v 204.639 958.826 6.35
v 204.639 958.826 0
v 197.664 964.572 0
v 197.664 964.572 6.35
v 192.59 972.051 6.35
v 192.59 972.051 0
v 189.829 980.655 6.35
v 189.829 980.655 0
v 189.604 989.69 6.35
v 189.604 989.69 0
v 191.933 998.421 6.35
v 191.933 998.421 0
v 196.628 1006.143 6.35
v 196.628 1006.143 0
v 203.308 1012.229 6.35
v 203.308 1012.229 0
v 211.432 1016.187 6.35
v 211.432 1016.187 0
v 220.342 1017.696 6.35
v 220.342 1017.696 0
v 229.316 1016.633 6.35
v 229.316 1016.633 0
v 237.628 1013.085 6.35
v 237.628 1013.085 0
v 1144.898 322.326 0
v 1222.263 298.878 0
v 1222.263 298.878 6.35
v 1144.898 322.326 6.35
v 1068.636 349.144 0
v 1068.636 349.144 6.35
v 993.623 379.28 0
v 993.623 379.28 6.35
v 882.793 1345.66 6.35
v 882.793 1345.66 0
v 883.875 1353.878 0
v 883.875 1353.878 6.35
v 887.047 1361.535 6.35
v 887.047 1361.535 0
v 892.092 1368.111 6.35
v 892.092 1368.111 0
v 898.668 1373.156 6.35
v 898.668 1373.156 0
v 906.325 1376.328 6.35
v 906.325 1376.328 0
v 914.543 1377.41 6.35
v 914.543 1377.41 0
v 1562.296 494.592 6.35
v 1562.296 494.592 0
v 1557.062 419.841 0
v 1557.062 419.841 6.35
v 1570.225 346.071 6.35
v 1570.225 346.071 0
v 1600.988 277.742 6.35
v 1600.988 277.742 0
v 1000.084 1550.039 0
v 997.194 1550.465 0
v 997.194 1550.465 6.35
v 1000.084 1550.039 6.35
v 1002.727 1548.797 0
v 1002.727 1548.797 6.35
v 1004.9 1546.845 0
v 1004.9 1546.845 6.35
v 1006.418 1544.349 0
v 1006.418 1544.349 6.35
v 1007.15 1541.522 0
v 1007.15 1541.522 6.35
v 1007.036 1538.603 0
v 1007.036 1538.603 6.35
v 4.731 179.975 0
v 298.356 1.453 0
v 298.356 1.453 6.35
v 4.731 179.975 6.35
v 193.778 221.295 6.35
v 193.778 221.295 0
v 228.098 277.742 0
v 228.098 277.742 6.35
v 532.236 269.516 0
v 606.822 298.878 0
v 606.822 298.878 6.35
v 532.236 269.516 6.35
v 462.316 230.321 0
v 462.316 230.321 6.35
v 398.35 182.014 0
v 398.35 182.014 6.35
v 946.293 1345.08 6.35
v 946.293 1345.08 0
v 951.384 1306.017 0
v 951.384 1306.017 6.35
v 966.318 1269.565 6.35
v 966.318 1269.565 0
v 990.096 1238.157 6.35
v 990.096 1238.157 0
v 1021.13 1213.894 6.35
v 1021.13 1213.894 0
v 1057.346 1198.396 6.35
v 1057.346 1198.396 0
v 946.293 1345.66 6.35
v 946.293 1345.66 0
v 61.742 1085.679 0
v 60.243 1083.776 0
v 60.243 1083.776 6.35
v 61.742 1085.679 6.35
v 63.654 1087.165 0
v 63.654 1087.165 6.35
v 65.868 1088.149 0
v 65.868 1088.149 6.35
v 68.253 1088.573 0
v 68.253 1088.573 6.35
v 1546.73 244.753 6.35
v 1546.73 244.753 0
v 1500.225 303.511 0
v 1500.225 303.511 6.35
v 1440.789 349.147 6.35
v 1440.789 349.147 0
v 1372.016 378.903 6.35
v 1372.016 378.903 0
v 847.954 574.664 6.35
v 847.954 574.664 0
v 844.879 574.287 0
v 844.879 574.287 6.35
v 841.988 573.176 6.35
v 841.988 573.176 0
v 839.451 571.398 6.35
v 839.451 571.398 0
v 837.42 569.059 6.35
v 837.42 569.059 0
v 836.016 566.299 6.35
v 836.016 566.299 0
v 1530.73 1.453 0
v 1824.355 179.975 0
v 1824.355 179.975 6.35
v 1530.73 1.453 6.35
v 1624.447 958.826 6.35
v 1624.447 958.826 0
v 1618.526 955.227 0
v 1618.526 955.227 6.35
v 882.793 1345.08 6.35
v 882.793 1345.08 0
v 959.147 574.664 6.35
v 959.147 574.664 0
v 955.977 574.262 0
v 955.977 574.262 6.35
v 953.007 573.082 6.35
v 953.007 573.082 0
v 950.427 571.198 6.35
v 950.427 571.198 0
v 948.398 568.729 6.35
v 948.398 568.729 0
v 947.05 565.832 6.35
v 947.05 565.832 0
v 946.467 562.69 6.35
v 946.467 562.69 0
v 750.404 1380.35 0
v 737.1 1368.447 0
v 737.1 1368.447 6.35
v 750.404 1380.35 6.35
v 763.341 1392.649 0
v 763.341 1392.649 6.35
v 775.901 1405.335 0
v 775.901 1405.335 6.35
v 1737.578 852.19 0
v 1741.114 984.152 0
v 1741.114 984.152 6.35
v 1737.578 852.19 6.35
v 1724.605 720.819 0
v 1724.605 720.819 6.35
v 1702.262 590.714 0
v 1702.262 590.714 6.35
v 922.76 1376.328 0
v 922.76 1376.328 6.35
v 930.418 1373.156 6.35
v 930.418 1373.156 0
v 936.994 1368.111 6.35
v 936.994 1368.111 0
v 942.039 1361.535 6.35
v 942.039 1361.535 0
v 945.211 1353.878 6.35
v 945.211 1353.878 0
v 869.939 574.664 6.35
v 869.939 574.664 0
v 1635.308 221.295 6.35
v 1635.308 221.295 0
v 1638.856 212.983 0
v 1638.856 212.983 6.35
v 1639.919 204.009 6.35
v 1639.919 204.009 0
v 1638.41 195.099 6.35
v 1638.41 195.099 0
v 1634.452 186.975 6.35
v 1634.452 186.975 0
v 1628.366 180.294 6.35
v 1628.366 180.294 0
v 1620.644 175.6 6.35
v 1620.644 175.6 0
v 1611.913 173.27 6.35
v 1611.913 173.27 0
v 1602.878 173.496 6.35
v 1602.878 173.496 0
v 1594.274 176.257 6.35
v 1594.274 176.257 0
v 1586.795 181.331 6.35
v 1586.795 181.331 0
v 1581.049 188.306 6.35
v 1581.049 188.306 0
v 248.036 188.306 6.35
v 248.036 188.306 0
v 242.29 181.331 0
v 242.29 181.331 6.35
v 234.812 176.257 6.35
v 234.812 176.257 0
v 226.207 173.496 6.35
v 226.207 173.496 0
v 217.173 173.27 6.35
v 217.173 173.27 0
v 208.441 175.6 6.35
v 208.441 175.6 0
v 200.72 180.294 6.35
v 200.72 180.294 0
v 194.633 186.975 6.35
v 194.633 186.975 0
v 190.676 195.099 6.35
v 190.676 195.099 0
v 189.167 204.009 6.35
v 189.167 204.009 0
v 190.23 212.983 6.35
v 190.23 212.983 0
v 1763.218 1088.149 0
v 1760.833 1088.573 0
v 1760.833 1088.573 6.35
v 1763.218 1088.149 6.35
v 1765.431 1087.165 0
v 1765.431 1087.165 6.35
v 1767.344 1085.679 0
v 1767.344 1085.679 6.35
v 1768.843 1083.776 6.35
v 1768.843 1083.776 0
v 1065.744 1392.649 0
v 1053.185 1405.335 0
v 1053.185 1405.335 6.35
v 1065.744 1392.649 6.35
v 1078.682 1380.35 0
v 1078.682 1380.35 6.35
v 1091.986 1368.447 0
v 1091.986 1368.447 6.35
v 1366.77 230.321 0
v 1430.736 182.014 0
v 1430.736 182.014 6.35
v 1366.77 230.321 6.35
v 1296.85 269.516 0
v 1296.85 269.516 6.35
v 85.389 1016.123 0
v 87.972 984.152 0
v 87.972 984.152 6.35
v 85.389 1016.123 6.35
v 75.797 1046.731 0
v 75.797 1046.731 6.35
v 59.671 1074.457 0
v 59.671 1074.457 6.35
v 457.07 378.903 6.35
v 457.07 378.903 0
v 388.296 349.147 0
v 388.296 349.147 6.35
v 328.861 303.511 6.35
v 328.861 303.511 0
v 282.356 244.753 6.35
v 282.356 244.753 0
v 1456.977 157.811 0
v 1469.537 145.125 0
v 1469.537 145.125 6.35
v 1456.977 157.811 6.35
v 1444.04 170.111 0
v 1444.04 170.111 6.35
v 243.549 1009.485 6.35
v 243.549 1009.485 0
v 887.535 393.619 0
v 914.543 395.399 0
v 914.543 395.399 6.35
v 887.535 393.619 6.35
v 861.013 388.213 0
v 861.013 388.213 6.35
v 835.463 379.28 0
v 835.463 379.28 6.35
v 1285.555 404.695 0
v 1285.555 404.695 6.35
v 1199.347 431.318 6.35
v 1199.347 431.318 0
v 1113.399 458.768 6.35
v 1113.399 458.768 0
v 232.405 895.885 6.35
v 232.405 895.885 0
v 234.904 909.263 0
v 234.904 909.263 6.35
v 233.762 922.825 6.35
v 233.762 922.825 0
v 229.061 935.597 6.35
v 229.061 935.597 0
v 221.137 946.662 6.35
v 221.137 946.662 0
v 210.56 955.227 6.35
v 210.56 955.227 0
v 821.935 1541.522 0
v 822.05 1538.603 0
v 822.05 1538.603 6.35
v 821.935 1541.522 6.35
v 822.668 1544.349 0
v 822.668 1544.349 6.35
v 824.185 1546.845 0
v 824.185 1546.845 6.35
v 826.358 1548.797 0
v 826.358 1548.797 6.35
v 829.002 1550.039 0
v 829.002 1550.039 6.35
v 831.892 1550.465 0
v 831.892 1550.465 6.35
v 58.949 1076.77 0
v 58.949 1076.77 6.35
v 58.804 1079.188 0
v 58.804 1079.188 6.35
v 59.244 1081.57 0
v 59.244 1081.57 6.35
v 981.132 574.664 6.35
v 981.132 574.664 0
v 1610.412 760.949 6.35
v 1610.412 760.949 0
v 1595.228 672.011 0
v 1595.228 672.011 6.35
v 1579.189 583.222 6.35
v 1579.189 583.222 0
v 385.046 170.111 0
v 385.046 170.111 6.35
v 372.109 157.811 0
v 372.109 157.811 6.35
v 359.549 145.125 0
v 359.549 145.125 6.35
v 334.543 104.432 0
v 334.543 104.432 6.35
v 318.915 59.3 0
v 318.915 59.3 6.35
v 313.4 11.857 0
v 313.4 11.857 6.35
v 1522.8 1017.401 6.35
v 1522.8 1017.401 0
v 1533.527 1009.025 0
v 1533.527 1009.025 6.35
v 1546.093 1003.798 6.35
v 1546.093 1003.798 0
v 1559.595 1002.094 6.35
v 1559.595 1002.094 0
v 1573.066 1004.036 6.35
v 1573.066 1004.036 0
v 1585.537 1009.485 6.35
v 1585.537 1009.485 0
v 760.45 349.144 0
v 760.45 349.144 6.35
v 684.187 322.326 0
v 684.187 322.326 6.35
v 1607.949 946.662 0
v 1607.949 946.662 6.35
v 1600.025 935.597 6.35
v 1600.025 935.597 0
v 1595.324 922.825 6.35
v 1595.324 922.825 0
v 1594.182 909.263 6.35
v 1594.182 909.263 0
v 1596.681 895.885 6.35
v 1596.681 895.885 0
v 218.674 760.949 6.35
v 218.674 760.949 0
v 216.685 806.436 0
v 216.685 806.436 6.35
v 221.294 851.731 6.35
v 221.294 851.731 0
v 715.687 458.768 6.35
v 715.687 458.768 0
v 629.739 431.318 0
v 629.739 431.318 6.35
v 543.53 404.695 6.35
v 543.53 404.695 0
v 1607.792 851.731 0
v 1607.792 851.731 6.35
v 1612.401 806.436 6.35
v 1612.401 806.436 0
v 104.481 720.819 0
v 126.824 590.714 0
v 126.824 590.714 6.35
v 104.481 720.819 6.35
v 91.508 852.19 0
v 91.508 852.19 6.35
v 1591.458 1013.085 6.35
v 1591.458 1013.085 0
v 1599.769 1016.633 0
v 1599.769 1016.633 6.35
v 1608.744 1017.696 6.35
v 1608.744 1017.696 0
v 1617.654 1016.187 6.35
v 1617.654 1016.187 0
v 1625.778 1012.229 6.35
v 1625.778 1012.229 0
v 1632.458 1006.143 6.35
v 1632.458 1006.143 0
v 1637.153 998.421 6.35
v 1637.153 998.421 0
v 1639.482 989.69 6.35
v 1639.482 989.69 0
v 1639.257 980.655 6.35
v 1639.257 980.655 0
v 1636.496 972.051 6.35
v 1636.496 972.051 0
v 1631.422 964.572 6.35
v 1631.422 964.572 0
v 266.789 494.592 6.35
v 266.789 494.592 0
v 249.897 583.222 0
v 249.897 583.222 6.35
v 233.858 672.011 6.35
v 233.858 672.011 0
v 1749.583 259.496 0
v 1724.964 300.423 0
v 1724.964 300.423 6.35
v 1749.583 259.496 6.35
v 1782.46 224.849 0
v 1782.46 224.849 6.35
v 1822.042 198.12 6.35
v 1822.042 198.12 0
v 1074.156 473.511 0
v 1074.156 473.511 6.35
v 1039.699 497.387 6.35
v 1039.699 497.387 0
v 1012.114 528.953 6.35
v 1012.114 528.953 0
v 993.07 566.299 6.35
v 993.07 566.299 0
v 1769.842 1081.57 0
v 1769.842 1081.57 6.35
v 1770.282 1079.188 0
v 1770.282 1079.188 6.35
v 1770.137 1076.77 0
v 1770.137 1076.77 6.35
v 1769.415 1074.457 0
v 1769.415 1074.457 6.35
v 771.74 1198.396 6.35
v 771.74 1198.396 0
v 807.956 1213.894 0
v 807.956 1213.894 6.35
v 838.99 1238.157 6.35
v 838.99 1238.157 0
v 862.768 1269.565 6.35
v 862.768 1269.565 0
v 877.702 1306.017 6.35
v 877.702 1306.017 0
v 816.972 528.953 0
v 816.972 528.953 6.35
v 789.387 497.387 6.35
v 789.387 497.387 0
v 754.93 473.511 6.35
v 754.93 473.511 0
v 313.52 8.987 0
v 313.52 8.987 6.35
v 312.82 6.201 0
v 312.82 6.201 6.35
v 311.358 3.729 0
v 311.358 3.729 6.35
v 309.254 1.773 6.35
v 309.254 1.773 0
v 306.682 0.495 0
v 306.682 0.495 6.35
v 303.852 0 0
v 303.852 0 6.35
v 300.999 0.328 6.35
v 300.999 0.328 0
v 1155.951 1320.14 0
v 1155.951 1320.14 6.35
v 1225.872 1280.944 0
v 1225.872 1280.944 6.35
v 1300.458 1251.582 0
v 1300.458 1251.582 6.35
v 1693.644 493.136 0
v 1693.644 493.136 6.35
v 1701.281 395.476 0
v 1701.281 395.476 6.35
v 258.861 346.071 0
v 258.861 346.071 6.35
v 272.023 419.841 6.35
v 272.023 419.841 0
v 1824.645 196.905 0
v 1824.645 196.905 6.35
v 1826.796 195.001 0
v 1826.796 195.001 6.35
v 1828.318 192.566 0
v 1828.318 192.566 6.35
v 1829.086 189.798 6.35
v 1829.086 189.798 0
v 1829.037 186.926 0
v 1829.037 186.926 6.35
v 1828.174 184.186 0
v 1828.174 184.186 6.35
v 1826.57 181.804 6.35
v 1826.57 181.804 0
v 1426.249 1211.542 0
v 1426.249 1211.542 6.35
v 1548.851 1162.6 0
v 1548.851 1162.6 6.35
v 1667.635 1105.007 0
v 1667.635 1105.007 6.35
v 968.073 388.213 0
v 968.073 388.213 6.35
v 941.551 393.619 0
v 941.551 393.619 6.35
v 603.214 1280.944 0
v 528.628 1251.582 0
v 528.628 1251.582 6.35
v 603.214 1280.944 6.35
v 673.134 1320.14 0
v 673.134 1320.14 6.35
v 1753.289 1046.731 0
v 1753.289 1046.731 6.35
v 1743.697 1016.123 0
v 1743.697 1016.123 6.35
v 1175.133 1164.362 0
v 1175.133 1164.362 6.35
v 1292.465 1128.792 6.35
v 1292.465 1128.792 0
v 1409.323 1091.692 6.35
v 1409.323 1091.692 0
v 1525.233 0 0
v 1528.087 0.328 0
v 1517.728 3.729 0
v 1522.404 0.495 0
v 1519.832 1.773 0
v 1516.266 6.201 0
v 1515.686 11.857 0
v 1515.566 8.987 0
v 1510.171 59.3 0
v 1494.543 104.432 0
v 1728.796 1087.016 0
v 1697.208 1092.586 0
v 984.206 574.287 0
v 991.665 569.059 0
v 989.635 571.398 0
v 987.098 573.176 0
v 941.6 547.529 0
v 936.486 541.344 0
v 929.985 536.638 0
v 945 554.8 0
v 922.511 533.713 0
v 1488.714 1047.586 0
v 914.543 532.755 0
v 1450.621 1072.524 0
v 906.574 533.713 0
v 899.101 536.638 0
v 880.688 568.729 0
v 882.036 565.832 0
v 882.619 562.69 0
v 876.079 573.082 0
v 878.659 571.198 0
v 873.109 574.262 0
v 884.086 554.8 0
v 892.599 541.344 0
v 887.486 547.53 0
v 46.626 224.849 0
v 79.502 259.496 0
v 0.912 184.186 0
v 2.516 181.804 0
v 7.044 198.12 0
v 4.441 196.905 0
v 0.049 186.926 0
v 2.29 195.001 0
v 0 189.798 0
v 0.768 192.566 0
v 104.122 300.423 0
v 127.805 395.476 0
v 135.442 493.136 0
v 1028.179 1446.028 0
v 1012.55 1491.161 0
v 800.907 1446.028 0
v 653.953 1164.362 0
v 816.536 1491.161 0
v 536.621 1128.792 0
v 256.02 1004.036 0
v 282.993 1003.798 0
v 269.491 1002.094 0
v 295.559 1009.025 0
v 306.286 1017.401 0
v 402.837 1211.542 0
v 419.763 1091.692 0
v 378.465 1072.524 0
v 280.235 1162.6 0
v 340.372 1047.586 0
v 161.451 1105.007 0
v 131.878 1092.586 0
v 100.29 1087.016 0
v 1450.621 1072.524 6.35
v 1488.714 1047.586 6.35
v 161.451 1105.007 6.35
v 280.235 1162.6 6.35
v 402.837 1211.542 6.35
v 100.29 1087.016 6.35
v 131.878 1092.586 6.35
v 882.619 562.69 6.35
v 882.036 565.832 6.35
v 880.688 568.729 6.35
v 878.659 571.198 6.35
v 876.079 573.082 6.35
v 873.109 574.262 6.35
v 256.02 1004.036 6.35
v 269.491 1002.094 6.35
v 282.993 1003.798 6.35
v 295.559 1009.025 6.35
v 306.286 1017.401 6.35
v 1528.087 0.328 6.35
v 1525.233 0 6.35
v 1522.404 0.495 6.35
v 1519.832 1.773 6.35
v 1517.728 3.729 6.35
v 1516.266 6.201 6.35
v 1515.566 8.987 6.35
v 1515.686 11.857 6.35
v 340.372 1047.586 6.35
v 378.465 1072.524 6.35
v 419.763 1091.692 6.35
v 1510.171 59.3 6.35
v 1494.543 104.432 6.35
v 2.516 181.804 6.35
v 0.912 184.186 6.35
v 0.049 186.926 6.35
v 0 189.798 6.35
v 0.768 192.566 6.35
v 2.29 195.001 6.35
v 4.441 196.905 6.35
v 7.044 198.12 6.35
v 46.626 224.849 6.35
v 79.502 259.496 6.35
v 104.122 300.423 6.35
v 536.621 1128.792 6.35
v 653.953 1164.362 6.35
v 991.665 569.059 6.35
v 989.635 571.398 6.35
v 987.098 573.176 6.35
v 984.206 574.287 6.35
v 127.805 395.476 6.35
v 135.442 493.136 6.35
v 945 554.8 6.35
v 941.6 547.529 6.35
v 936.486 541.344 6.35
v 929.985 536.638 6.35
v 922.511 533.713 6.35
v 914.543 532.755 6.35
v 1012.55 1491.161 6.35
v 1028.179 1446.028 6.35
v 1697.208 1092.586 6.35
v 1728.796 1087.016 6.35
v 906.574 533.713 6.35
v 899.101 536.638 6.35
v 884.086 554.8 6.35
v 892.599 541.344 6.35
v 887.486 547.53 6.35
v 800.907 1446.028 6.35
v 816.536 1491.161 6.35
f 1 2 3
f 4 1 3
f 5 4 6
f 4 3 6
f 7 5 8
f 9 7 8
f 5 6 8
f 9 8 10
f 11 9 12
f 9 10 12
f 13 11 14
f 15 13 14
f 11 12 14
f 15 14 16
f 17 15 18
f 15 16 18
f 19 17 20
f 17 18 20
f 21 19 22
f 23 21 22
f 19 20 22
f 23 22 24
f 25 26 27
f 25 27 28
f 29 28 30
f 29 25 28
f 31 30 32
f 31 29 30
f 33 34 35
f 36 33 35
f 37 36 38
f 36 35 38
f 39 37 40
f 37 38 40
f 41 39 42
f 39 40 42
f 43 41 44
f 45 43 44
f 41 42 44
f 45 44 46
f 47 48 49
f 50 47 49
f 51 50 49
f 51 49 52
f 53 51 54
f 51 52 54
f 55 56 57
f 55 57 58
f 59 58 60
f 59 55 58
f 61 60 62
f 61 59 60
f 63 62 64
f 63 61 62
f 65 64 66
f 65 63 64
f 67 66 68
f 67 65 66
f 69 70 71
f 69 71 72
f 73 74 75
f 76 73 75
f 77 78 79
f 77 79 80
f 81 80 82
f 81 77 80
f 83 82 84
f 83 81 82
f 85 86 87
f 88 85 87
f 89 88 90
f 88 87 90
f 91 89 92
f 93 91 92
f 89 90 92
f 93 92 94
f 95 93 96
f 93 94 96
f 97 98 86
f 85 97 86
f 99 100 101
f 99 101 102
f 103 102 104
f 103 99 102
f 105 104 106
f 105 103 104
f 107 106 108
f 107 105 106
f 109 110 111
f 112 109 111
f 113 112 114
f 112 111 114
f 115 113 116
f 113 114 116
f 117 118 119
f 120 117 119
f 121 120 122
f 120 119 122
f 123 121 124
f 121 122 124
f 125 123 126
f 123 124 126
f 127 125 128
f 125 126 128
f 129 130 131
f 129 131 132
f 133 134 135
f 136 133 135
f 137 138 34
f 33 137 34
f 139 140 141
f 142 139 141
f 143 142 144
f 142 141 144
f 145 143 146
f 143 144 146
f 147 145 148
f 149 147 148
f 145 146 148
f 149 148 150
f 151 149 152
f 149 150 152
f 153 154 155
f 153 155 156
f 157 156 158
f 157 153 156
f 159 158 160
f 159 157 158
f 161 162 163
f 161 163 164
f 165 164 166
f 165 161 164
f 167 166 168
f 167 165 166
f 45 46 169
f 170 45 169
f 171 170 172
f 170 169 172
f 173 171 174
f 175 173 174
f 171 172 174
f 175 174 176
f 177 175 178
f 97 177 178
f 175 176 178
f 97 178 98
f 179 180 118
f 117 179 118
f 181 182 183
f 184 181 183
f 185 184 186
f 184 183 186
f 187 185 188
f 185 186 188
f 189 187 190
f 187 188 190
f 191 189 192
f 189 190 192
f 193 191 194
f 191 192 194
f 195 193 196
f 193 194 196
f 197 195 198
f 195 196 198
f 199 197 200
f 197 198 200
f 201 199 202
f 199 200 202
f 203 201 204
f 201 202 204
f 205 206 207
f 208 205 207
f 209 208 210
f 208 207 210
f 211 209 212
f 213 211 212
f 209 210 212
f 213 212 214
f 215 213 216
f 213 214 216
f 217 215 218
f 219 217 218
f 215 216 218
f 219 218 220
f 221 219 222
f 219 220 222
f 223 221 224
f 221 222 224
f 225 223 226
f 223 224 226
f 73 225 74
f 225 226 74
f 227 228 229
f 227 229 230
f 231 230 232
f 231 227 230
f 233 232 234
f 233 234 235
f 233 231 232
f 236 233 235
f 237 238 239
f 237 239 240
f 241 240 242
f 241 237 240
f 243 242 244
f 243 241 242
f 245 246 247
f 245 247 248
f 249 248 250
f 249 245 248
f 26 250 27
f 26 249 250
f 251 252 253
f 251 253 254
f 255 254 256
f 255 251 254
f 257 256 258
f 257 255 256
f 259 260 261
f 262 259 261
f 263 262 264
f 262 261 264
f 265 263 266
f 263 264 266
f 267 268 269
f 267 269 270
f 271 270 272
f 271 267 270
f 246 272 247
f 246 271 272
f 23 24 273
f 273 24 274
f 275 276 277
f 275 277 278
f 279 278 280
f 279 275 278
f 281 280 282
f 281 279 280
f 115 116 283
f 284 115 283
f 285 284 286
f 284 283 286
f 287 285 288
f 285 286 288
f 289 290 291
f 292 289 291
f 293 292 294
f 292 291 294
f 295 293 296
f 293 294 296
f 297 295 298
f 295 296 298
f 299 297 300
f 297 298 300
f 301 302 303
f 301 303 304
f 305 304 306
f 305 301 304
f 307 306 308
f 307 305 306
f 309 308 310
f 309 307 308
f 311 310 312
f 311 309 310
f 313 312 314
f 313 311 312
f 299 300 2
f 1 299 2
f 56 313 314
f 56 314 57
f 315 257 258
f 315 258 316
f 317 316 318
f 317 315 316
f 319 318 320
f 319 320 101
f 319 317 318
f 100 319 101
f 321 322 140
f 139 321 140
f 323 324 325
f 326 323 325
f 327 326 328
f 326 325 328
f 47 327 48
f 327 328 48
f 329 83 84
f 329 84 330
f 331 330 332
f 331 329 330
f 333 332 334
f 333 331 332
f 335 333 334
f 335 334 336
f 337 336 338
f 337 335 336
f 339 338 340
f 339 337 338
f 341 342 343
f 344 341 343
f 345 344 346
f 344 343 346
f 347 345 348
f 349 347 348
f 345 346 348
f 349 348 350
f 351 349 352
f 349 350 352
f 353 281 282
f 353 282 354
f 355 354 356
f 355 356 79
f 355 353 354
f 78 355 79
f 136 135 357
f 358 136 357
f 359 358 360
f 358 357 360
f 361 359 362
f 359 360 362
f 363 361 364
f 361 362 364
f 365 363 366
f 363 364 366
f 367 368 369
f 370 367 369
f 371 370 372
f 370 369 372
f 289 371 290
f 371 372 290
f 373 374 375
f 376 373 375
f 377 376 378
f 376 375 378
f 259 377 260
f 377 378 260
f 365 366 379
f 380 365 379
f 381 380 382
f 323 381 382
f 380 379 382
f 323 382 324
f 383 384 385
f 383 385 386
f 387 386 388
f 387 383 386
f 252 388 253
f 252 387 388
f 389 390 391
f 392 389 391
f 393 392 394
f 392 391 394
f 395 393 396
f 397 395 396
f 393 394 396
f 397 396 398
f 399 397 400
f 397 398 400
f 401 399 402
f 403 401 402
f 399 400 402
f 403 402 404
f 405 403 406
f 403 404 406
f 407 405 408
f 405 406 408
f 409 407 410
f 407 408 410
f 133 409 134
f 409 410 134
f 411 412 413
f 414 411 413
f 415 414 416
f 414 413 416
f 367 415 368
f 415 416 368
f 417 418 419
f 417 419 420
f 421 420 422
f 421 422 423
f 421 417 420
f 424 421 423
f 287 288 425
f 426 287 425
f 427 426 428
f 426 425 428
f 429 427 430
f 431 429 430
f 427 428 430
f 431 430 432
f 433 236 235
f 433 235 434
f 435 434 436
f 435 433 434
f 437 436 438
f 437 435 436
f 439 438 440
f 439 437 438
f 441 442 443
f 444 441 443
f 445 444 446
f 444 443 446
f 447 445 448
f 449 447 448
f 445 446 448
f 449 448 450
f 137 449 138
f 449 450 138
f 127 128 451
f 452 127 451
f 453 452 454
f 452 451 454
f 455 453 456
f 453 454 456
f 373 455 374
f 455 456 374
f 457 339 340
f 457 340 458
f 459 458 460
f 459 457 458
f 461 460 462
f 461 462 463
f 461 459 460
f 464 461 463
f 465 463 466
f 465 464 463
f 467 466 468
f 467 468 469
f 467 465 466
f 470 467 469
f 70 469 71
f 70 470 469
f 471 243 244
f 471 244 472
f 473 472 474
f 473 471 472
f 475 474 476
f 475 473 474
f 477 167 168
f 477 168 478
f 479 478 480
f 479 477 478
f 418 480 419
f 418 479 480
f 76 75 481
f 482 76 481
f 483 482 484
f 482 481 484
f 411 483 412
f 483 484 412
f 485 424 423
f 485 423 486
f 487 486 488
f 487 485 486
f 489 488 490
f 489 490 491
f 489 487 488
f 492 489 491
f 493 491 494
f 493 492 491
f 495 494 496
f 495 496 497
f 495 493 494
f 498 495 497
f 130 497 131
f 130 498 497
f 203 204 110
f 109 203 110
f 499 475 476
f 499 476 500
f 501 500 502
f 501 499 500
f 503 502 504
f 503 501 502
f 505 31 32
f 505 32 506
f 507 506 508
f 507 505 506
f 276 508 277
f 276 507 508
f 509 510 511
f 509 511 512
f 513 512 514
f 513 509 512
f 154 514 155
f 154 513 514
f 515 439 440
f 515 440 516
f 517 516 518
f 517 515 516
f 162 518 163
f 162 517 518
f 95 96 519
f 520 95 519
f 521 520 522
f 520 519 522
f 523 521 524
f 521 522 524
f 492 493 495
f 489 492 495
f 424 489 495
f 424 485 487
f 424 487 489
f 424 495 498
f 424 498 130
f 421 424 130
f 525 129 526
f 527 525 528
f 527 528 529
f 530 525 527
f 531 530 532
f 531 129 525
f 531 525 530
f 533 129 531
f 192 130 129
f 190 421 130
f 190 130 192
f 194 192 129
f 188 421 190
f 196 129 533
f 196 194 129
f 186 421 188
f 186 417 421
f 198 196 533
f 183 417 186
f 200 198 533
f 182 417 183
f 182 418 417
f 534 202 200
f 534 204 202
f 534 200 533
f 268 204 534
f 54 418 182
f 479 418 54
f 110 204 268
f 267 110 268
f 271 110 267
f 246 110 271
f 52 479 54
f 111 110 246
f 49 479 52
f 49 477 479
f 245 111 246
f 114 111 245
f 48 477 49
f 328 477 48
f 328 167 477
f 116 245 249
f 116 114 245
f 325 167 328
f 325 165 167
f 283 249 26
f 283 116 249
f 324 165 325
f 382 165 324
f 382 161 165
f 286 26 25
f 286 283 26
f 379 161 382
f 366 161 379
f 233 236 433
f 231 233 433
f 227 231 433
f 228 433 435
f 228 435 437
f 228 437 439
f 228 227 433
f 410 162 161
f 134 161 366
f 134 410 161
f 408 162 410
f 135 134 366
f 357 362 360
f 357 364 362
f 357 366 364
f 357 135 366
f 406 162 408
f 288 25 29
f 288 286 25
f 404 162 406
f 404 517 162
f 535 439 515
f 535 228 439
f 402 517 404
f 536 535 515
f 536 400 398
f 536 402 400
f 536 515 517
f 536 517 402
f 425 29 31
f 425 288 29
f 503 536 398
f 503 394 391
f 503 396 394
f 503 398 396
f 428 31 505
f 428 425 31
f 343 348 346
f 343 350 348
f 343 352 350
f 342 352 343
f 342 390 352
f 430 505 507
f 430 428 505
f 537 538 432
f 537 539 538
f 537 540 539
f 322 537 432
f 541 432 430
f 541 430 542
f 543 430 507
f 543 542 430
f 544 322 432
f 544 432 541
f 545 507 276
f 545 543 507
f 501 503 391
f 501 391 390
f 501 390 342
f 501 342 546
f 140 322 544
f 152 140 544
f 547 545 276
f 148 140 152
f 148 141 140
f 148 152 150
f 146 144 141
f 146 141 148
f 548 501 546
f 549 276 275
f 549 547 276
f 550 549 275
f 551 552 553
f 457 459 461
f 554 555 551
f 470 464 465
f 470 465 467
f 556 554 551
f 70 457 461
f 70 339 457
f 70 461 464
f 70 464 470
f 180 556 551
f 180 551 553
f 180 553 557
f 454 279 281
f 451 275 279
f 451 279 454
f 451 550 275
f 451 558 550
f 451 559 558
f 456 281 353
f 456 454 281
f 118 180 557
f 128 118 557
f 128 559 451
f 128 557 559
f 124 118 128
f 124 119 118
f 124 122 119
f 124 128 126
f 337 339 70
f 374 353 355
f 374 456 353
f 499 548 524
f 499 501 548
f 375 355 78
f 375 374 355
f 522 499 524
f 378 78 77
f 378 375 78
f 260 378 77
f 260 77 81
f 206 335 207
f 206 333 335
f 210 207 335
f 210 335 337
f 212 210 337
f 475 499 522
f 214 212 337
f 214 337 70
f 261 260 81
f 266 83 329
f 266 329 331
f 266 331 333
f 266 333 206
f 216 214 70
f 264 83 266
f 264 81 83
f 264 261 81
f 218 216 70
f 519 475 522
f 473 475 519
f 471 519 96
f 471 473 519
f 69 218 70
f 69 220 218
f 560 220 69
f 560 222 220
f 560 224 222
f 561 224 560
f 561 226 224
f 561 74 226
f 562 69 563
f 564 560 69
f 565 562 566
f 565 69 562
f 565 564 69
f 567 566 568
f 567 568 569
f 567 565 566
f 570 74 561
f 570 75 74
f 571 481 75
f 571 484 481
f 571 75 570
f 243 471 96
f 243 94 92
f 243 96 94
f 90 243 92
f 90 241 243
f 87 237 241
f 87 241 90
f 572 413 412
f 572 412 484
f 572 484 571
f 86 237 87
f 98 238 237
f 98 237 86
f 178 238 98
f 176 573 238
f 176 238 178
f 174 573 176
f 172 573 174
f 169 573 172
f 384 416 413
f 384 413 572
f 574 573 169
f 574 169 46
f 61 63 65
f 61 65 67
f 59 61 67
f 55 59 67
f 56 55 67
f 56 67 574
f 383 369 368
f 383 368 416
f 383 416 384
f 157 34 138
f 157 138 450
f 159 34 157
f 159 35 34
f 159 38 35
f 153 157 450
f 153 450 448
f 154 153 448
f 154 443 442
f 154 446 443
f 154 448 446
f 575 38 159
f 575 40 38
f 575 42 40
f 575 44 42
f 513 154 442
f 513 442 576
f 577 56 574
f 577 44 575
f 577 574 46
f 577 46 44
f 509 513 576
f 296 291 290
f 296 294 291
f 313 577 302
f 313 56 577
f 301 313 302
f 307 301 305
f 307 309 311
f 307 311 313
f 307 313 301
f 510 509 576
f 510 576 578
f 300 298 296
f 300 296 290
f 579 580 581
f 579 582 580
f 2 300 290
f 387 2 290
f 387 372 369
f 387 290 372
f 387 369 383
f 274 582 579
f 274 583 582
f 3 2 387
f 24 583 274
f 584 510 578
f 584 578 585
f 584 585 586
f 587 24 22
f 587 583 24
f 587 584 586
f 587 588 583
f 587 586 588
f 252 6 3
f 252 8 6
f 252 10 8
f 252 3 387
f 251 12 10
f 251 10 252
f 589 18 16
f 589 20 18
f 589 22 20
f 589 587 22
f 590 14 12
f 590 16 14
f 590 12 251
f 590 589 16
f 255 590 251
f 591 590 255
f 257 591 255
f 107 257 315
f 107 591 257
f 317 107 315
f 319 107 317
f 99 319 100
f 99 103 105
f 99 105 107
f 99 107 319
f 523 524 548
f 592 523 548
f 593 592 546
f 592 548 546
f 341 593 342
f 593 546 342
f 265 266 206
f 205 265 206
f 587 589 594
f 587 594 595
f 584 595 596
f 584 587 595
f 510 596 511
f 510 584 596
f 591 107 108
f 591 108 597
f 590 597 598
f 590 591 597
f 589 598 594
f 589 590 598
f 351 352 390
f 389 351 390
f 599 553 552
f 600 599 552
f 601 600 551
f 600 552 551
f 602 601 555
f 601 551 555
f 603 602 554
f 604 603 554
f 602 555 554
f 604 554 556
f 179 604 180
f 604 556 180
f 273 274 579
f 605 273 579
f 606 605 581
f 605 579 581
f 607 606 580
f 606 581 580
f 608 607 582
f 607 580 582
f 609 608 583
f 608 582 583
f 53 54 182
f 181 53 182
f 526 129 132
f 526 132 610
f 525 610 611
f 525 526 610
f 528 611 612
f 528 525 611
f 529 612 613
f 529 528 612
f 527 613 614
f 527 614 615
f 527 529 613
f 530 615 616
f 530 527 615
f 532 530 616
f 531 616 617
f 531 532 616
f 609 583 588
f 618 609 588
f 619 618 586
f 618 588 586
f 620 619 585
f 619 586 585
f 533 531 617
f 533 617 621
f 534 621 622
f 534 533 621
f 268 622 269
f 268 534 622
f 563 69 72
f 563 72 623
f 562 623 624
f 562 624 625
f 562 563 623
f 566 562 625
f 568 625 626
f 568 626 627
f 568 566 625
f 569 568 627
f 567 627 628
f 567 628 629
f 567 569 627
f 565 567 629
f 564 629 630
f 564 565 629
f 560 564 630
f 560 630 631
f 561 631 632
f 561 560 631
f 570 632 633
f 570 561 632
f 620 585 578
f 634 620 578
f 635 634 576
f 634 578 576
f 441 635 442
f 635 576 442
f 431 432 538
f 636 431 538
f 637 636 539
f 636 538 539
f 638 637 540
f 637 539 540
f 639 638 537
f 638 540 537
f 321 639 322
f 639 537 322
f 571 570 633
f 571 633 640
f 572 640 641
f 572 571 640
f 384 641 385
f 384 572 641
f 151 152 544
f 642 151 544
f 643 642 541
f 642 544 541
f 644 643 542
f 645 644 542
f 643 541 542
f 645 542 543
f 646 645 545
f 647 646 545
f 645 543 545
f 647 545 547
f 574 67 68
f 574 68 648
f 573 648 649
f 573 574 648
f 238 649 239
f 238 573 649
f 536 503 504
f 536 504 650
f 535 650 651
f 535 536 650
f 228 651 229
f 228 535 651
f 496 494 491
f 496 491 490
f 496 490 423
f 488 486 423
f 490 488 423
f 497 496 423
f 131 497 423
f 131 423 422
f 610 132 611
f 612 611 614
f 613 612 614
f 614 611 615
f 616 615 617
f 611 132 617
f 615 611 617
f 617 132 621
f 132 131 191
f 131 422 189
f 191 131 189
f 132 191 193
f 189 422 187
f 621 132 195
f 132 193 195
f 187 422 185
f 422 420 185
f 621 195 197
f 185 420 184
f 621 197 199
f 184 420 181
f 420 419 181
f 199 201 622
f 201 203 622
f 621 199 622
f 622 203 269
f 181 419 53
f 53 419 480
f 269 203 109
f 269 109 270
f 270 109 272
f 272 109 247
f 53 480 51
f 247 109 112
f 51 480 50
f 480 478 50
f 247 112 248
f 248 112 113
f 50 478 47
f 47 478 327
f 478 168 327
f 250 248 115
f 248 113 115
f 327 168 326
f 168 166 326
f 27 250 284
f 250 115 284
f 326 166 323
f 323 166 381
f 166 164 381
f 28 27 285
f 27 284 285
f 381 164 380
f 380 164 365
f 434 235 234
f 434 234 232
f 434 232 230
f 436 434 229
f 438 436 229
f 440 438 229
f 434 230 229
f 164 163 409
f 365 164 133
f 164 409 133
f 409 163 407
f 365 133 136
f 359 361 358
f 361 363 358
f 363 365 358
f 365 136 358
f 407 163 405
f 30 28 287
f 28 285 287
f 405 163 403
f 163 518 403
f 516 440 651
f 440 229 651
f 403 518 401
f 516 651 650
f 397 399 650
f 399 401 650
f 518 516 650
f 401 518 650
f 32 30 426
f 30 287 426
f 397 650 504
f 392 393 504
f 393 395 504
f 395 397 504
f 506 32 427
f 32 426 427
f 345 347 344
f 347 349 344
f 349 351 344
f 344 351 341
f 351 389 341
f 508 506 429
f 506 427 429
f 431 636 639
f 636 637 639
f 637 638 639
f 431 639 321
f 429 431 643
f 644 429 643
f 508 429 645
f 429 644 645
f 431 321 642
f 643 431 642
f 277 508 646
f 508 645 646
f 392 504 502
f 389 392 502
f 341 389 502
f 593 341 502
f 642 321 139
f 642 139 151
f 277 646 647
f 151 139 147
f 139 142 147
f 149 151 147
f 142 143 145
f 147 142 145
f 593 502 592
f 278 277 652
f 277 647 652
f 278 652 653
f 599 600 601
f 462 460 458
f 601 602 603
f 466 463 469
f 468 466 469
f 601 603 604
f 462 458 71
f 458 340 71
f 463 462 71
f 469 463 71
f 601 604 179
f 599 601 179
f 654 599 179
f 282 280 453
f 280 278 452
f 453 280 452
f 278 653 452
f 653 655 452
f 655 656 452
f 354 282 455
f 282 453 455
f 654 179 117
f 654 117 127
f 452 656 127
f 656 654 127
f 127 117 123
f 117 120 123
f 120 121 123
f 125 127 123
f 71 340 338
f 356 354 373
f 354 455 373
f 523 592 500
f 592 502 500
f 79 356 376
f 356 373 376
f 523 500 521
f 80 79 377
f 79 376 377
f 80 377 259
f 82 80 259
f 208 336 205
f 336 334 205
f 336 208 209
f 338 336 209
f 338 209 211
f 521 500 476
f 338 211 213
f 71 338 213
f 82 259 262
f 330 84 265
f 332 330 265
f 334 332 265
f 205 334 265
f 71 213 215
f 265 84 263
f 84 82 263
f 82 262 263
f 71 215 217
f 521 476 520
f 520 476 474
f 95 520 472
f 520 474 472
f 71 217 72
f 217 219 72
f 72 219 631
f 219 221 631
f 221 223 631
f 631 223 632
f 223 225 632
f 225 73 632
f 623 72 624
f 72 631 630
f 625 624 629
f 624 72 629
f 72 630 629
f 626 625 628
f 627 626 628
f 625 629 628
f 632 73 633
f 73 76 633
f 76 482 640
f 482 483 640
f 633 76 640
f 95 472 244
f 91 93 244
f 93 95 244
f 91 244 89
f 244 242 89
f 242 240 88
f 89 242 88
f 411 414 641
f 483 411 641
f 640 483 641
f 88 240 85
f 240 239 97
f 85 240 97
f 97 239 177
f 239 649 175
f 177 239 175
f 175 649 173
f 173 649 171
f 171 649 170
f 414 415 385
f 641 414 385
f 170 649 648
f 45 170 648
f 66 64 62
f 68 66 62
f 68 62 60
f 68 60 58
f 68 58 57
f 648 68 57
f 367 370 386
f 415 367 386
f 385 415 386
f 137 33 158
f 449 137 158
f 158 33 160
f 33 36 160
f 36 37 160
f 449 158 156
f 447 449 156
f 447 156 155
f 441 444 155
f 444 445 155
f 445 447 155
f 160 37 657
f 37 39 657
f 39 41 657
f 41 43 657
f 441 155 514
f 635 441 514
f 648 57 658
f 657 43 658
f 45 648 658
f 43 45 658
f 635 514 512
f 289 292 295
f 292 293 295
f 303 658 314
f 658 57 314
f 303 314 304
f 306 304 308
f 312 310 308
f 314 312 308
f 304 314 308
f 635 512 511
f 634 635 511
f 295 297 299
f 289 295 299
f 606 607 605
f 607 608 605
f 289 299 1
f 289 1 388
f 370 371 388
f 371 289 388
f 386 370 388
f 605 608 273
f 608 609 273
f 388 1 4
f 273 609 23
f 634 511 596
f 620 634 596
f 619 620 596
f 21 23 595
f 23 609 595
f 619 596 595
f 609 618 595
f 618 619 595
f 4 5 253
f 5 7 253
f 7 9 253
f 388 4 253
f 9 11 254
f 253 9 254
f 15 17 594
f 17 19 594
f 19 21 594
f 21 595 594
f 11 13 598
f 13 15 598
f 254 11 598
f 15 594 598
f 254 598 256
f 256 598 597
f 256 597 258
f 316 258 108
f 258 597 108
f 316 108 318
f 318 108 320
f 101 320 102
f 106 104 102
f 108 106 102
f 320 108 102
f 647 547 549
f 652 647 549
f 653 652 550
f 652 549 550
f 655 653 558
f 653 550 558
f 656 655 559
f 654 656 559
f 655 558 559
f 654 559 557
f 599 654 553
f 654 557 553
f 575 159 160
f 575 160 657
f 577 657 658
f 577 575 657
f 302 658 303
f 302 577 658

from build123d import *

# Parameters (mm, degrees)
BOSS_EXTRUDE1_DEPTH = 6.35


with BuildPart() as part:
    # Model → Boss-Extrude1 (new body)
    with BuildSketch(Plane.XY):
        with BuildLine():
            Line((4.731109074, 179.975171138), (151.543552764, 90.714118443))
            Line((151.543552764, 90.714118443), (298.355996454, 1.453065748))
            ThreePointArc((298.355996454, 1.453065748), (309.25405907, 1.773353837), (313.400175898, 11.857007366))
            ThreePointArc((313.400175898, 11.857007366), (325.499817287, 82.291618906), (359.548910429, 145.125487805))
            ThreePointArc((359.548910429, 145.125487805), (378.530992835, 164.009725995), (398.349908157, 182.013739434))
            ThreePointArc((398.349908157, 182.013739434), (496.609924919, 251.106758089), (606.822390935, 298.877967575))
            ThreePointArc((606.822390935, 298.877967575), (722.465722657, 335.316646957), (835.462841761, 379.280366099))
            ThreePointArc((835.462841761, 379.280366099), (874.182548891, 391.364362796), (914.542928671, 395.39901772))
            ThreePointArc((914.542928671, 395.39901772), (954.903308451, 391.364362796), (993.62301558, 379.280366099))
            ThreePointArc((993.62301558, 379.280366099), (1106.620134686, 335.316646956), (1222.26346641, 298.877967574))
            ThreePointArc((1222.26346641, 298.877967574), (1332.475932423, 251.106758088), (1430.735949184, 182.013739434))
            ThreePointArc((1430.735949184, 182.013739434), (1450.554864506, 164.009725995), (1469.536946912, 145.125487805))
            ThreePointArc((1469.536946912, 145.125487805), (1503.586040054, 82.291618906), (1515.685681443, 11.857007366))
            ThreePointArc((1515.685681443, 11.857007366), (1519.831798271, 1.773353837), (1530.729860887, 1.453065748))
            Line((1530.729860887, 1.453065748), (1677.542304577, 90.714118443))
            Line((1677.542304577, 90.714118443), (1824.354748267, 179.975171138))
            ThreePointArc((1824.354748267, 179.975171138), (1829.085903545, 189.797926504), (1822.041714251, 198.119569997))
            ThreePointArc((1822.041714251, 198.119569997), (1765.078027346, 241.277120886), (1724.963897376, 300.423485114))
            ThreePointArc((1724.963897376, 300.423485114), (1695.433102398, 444.147036942), (1702.261958811, 590.714065711))
            ThreePointArc((1702.261958811, 590.714065711), (1732.268416352, 786.388398141), (1741.114180038, 984.152359294))
            ThreePointArc((1741.114180038, 984.152359294), (1747.638220475, 1031.694941858), (1769.415270954, 1074.457312383))
            ThreePointArc((1769.415270954, 1074.457312383), (1770.281785592, 1079.18754246), (1768.843236262, 1083.776278673))
            ThreePointArc((1768.843236262, 1083.776278673), (1765.431383684, 1087.165258783), (1760.833075168, 1088.572910369))
            ThreePointArc((1760.833075168, 1088.572910369), (1712.84619872, 1088.919247204), (1667.635170438, 1105.00722974))
            ThreePointArc((1667.635170438, 1105.00722974), (1487.988377024, 1188.168888466), (1300.458187217, 1251.582292231))
            ThreePointArc((1300.458187217, 1251.582292231), (1190.245721199, 1299.353501718), (1091.985704435, 1368.446520373))
            ThreePointArc((1091.985704435, 1368.446520373), (1072.166789113, 1386.450533813), (1053.184706708, 1405.334772002))
            ThreePointArc((1053.184706708, 1405.334772002), (1019.135613566, 1468.168640901), (1007.035972176, 1538.603252442))
            ThreePointArc((1007.035972176, 1538.603252442), (1004.900450409, 1546.845116579), (997.194061205, 1550.464556193))
            Line((997.194061205, 1550.464556193), (914.542928671, 1550.464556193))
            Line((914.542928671, 1550.464556193), (831.891796136, 1550.464556193))
            ThreePointArc((831.891796136, 1550.464556193), (824.185406932, 1546.845116579), (822.049885165, 1538.603252442))
            ThreePointArc((822.049885165, 1538.603252442), (809.950243775, 1468.168640901), (775.901150633, 1405.334772002))
            ThreePointArc((775.901150633, 1405.334772002), (756.919068228, 1386.450533813), (737.100152906, 1368.446520373))
            ThreePointArc((737.100152906, 1368.446520373), (638.840136142, 1299.353501718), (528.627670124, 1251.582292231))
            ThreePointArc((528.627670124, 1251.582292231), (341.097480319, 1188.168888466), (161.450686905, 1105.007229742))
            ThreePointArc((161.450686905, 1105.007229742), (116.239658622, 1088.919247204), (68.252782173, 1088.572910369))
            ThreePointArc((68.252782173, 1088.572910369), (63.654473657, 1087.165258783), (60.242621079, 1083.776278673))
            ThreePointArc((60.242621079, 1083.776278673), (58.804071749, 1079.18754246), (59.670586387, 1074.457312383))
            ThreePointArc((59.670586387, 1074.457312383), (81.447636866, 1031.694941858), (87.971677303, 984.152359294))
            ThreePointArc((87.971677303, 984.152359294), (96.817440989, 786.388398141), (126.82389853, 590.714065711))
            ThreePointArc((126.82389853, 590.714065711), (133.652754943, 444.147036942), (104.121959965, 300.423485114))
            ThreePointArc((104.121959965, 300.423485114), (64.007829995, 241.277120886), (7.04414309, 198.119569997))
            ThreePointArc((7.04414309, 198.119569997), (-4.6204e-05, 189.797926504), (4.731109074, 179.975171138))
        make_face()
        with BuildLine():
            ThreePointArc((248.036389916, 188.305700503), (204.412712542, 177.670862829), (193.777874867, 221.294540203))
            Line((193.777874867, 221.294540203), (228.097625685, 277.742076191))
            ThreePointArc((228.097625685, 277.742076191), (267.717827548, 382.549812212), (266.789374301, 494.592482209))
            ThreePointArc((266.789374301, 494.592482209), (241.770965978, 627.59734054), (218.673506786, 760.949207694))
            ThreePointArc((218.673506786, 760.949207694), (218.167687021, 829.167165589), (232.404753167, 895.884866243))
            ThreePointArc((232.404753167, 895.884866243), (231.841152746, 929.369079724), (210.559765814, 955.226627329))
            Line((210.559765814, 955.226627329), (204.638979738, 958.826428441))
            ThreePointArc((204.638979738, 958.826428441), (194.004142064, 1002.450105815), (237.627819438, 1013.084943489))
            Line((237.627819438, 1013.084943489), (243.548605514, 1009.485142378))
            ThreePointArc((243.548605514, 1009.485142378), (276.299184629, 1002.491590666), (306.286010429, 1017.401335007))
            ThreePointArc((306.286010429, 1017.401335007), (358.96611995, 1060.745904377), (419.763138988, 1091.692117541))
            ThreePointArc((419.763138988, 1091.692117541), (595.228682895, 1146.768807529), (771.739960804, 1198.39600627))
            ThreePointArc((771.739960804, 1198.39600627), (851.898170732, 1253.089548855), (882.79292867, 1345.079962222))
            Line((882.79292867, 1345.079962222), (882.79292867, 1345.660139454))
            ThreePointArc((882.79292867, 1345.660139454), (892.092288368, 1368.110779757), (914.542928671, 1377.410139455))
            ThreePointArc((914.542928671, 1377.410139455), (936.993568973, 1368.110779757), (946.292928671, 1345.660139454))
            Line((946.292928671, 1345.660139454), (946.292928671, 1345.079962222))
            ThreePointArc((946.292928671, 1345.079962222), (977.187686609, 1253.089548855), (1057.345896537, 1198.39600627))
            ThreePointArc((1057.345896537, 1198.39600627), (1233.857174446, 1146.768807529), (1409.322718353, 1091.692117541))
            ThreePointArc((1409.322718353, 1091.692117541), (1470.119737391, 1060.745904377), (1522.799846912, 1017.401335006))
            ThreePointArc((1522.799846912, 1017.401335006), (1552.786672713, 1002.491590666), (1585.537251828, 1009.485142378))
            Line((1585.537251828, 1009.485142378), (1591.458037903, 1013.084943489))
            ThreePointArc((1591.458037903, 1013.084943489), (1635.081715277, 1002.450105815), (1624.446877603, 958.826428441))
            Line((1624.446877603, 958.826428441), (1618.526091527, 955.226627329))
            ThreePointArc((1618.526091527, 955.226627329), (1597.244704595, 929.369079725), (1596.681104174, 895.884866243))
            ThreePointArc((1596.681104174, 895.884866243), (1610.91817032, 829.167165589), (1610.412350555, 760.949207694))
            ThreePointArc((1610.412350555, 760.949207694), (1587.314891364, 627.597340544), (1562.296483041, 494.592482218))
            ThreePointArc((1562.296483041, 494.592482218), (1561.368029793, 382.549812216), (1600.988231656, 277.742076191))
            Line((1600.988231656, 277.742076191), (1635.307982474, 221.294540203))
            ThreePointArc((1635.307982474, 221.294540203), (1624.673144799, 177.670862829), (1581.049467425, 188.305700503))
            Line((1581.049467425, 188.305700503), (1546.729716607, 244.753236491))
            ThreePointArc((1546.729716607, 244.753236491), (1471.914922649, 328.162879411), (1372.015609312, 378.902894406))
            ThreePointArc((1372.015609312, 378.902894406), (1242.41928054, 417.90295417), (1113.398935267, 458.768142267))
            ThreePointArc((1113.398935267, 458.768142267), (1039.69925486, 497.387302002), (993.069617081, 566.298543982))
            ThreePointArc((993.069617081, 566.298543982), (988.420625685, 572.364700975), (981.132076965, 574.664361651))
            Line((981.132076965, 574.664361651), (959.146552953, 574.664361651))
            ThreePointArc((959.146552953, 574.664361651), (950.426671687, 571.197653085), (946.467308072, 562.690136563))
            ThreePointArc((946.467308072, 562.690136563), (936.486383713, 541.343696224), (914.542586541, 532.755382542))
            ThreePointArc((914.542586541, 532.755382542), (892.599225651, 541.343933359), (882.618549269, 562.690136563))
            ThreePointArc((882.618549269, 562.690136563), (878.659185654, 571.197653084), (869.939304388, 574.664361651))
            Line((869.939304388, 574.664361651), (847.953780376, 574.664361651))
            ThreePointArc((847.953780376, 574.664361651), (840.665231667, 572.364700959), (836.01624026, 566.298543983))
            ThreePointArc((836.01624026, 566.298543983), (789.386602481, 497.387302002), (715.686922074, 458.768142267))
            ThreePointArc((715.686922074, 458.768142267), (586.666576793, 417.902954168), (457.070248014, 378.902894401))
            ThreePointArc((457.070248014, 378.902894401), (357.170934686, 328.162879406), (282.356140734, 244.753236492))
            Line((282.356140734, 244.753236492), (248.036389916, 188.305700503))
        make_face(mode=Mode.SUBTRACT)
    extrude(amount=BOSS_EXTRUDE1_DEPTH)


solid = part.part
